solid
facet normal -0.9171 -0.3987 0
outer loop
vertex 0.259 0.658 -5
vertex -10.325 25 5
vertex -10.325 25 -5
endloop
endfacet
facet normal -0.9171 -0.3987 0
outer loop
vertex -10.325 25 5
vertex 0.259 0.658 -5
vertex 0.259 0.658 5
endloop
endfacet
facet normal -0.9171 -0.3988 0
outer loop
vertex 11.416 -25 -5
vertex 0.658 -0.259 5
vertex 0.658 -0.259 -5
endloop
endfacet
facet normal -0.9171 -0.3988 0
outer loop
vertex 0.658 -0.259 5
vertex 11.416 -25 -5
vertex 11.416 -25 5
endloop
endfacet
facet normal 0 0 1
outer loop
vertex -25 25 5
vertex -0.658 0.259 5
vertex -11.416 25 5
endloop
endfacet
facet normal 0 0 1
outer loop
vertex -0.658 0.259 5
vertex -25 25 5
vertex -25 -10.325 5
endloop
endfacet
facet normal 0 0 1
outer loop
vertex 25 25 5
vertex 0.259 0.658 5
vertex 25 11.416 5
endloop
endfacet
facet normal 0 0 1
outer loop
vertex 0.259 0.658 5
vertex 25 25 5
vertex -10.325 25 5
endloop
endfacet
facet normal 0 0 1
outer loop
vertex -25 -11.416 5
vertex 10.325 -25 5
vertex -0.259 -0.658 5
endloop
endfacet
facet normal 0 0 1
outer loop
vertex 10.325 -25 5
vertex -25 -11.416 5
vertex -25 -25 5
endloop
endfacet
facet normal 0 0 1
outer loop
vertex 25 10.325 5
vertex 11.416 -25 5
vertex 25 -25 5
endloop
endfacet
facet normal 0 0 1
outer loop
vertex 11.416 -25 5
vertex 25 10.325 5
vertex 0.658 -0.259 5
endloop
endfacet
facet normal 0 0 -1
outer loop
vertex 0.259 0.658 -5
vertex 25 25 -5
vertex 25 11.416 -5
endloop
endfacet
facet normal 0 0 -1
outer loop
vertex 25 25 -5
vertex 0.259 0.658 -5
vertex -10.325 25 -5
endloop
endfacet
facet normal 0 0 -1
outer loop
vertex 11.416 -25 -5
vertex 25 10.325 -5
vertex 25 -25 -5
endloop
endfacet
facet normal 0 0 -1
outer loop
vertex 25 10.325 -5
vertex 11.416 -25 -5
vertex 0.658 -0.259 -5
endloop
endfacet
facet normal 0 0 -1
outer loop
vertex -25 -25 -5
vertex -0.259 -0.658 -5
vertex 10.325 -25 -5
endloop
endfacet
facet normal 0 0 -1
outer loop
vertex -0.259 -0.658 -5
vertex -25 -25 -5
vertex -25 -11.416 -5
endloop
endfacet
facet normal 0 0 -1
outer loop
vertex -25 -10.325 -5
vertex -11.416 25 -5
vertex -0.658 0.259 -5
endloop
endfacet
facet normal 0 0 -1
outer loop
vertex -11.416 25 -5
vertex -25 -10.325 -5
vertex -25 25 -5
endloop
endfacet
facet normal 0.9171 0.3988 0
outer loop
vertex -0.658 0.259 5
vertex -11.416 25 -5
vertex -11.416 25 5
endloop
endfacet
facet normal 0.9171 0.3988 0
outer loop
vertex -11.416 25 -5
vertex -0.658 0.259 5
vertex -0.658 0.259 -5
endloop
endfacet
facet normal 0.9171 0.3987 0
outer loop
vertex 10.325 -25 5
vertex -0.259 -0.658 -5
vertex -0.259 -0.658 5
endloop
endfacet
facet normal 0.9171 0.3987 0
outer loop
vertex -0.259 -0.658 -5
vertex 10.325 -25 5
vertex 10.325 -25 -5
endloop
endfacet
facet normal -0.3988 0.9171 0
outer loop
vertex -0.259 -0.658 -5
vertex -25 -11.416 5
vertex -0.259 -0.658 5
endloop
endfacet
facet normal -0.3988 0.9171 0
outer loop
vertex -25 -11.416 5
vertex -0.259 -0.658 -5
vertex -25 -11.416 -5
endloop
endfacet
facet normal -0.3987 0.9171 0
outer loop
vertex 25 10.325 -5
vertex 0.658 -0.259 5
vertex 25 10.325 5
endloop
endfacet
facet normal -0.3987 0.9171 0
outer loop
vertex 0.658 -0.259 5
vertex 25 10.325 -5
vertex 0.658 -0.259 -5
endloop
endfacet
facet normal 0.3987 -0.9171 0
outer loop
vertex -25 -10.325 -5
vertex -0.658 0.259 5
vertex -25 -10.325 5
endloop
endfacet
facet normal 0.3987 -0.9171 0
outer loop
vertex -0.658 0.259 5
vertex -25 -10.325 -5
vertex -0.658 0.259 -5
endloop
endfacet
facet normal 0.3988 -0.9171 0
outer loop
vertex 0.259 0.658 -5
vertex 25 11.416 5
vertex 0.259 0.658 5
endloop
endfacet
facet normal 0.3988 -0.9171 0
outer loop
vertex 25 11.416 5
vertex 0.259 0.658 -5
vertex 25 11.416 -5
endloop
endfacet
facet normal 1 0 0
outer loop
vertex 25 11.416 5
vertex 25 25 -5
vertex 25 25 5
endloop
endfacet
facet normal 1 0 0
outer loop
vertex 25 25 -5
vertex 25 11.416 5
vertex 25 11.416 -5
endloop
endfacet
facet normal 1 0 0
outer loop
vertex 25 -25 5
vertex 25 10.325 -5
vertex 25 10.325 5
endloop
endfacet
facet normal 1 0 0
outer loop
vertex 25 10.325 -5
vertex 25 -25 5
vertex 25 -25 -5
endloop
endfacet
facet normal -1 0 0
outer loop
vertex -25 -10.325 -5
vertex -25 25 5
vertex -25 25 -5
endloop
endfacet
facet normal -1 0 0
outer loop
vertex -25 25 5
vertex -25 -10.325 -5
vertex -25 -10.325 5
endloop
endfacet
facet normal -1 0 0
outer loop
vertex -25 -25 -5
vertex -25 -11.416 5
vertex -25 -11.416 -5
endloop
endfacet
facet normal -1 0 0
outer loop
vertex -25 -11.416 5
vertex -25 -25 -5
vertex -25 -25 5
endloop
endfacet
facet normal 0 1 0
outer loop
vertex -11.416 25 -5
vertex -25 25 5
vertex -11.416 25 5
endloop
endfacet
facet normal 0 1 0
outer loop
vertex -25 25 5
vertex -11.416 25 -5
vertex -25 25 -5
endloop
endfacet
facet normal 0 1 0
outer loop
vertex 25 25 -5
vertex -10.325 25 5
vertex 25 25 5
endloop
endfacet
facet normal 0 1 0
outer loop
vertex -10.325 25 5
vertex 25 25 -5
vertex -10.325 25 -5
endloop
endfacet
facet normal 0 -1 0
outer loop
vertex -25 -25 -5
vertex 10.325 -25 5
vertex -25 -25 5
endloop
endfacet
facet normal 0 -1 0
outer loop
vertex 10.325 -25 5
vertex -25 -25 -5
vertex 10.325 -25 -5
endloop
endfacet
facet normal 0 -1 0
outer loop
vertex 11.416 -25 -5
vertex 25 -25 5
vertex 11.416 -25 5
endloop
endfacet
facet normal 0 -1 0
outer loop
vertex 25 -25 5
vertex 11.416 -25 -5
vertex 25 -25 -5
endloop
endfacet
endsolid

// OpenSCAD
rute = [50,50,10];
storrute = [1,100,10];
r = 23.5;

difference() {
    cube(rute, center = true);
    //translate([-storrute[0],0,0]) 
    {
        rotate(r) {
            cube(storrute, center = true);
            rotate([0,0,90]) {
                cube(storrute, center = true);
            }
        }
    }
}
